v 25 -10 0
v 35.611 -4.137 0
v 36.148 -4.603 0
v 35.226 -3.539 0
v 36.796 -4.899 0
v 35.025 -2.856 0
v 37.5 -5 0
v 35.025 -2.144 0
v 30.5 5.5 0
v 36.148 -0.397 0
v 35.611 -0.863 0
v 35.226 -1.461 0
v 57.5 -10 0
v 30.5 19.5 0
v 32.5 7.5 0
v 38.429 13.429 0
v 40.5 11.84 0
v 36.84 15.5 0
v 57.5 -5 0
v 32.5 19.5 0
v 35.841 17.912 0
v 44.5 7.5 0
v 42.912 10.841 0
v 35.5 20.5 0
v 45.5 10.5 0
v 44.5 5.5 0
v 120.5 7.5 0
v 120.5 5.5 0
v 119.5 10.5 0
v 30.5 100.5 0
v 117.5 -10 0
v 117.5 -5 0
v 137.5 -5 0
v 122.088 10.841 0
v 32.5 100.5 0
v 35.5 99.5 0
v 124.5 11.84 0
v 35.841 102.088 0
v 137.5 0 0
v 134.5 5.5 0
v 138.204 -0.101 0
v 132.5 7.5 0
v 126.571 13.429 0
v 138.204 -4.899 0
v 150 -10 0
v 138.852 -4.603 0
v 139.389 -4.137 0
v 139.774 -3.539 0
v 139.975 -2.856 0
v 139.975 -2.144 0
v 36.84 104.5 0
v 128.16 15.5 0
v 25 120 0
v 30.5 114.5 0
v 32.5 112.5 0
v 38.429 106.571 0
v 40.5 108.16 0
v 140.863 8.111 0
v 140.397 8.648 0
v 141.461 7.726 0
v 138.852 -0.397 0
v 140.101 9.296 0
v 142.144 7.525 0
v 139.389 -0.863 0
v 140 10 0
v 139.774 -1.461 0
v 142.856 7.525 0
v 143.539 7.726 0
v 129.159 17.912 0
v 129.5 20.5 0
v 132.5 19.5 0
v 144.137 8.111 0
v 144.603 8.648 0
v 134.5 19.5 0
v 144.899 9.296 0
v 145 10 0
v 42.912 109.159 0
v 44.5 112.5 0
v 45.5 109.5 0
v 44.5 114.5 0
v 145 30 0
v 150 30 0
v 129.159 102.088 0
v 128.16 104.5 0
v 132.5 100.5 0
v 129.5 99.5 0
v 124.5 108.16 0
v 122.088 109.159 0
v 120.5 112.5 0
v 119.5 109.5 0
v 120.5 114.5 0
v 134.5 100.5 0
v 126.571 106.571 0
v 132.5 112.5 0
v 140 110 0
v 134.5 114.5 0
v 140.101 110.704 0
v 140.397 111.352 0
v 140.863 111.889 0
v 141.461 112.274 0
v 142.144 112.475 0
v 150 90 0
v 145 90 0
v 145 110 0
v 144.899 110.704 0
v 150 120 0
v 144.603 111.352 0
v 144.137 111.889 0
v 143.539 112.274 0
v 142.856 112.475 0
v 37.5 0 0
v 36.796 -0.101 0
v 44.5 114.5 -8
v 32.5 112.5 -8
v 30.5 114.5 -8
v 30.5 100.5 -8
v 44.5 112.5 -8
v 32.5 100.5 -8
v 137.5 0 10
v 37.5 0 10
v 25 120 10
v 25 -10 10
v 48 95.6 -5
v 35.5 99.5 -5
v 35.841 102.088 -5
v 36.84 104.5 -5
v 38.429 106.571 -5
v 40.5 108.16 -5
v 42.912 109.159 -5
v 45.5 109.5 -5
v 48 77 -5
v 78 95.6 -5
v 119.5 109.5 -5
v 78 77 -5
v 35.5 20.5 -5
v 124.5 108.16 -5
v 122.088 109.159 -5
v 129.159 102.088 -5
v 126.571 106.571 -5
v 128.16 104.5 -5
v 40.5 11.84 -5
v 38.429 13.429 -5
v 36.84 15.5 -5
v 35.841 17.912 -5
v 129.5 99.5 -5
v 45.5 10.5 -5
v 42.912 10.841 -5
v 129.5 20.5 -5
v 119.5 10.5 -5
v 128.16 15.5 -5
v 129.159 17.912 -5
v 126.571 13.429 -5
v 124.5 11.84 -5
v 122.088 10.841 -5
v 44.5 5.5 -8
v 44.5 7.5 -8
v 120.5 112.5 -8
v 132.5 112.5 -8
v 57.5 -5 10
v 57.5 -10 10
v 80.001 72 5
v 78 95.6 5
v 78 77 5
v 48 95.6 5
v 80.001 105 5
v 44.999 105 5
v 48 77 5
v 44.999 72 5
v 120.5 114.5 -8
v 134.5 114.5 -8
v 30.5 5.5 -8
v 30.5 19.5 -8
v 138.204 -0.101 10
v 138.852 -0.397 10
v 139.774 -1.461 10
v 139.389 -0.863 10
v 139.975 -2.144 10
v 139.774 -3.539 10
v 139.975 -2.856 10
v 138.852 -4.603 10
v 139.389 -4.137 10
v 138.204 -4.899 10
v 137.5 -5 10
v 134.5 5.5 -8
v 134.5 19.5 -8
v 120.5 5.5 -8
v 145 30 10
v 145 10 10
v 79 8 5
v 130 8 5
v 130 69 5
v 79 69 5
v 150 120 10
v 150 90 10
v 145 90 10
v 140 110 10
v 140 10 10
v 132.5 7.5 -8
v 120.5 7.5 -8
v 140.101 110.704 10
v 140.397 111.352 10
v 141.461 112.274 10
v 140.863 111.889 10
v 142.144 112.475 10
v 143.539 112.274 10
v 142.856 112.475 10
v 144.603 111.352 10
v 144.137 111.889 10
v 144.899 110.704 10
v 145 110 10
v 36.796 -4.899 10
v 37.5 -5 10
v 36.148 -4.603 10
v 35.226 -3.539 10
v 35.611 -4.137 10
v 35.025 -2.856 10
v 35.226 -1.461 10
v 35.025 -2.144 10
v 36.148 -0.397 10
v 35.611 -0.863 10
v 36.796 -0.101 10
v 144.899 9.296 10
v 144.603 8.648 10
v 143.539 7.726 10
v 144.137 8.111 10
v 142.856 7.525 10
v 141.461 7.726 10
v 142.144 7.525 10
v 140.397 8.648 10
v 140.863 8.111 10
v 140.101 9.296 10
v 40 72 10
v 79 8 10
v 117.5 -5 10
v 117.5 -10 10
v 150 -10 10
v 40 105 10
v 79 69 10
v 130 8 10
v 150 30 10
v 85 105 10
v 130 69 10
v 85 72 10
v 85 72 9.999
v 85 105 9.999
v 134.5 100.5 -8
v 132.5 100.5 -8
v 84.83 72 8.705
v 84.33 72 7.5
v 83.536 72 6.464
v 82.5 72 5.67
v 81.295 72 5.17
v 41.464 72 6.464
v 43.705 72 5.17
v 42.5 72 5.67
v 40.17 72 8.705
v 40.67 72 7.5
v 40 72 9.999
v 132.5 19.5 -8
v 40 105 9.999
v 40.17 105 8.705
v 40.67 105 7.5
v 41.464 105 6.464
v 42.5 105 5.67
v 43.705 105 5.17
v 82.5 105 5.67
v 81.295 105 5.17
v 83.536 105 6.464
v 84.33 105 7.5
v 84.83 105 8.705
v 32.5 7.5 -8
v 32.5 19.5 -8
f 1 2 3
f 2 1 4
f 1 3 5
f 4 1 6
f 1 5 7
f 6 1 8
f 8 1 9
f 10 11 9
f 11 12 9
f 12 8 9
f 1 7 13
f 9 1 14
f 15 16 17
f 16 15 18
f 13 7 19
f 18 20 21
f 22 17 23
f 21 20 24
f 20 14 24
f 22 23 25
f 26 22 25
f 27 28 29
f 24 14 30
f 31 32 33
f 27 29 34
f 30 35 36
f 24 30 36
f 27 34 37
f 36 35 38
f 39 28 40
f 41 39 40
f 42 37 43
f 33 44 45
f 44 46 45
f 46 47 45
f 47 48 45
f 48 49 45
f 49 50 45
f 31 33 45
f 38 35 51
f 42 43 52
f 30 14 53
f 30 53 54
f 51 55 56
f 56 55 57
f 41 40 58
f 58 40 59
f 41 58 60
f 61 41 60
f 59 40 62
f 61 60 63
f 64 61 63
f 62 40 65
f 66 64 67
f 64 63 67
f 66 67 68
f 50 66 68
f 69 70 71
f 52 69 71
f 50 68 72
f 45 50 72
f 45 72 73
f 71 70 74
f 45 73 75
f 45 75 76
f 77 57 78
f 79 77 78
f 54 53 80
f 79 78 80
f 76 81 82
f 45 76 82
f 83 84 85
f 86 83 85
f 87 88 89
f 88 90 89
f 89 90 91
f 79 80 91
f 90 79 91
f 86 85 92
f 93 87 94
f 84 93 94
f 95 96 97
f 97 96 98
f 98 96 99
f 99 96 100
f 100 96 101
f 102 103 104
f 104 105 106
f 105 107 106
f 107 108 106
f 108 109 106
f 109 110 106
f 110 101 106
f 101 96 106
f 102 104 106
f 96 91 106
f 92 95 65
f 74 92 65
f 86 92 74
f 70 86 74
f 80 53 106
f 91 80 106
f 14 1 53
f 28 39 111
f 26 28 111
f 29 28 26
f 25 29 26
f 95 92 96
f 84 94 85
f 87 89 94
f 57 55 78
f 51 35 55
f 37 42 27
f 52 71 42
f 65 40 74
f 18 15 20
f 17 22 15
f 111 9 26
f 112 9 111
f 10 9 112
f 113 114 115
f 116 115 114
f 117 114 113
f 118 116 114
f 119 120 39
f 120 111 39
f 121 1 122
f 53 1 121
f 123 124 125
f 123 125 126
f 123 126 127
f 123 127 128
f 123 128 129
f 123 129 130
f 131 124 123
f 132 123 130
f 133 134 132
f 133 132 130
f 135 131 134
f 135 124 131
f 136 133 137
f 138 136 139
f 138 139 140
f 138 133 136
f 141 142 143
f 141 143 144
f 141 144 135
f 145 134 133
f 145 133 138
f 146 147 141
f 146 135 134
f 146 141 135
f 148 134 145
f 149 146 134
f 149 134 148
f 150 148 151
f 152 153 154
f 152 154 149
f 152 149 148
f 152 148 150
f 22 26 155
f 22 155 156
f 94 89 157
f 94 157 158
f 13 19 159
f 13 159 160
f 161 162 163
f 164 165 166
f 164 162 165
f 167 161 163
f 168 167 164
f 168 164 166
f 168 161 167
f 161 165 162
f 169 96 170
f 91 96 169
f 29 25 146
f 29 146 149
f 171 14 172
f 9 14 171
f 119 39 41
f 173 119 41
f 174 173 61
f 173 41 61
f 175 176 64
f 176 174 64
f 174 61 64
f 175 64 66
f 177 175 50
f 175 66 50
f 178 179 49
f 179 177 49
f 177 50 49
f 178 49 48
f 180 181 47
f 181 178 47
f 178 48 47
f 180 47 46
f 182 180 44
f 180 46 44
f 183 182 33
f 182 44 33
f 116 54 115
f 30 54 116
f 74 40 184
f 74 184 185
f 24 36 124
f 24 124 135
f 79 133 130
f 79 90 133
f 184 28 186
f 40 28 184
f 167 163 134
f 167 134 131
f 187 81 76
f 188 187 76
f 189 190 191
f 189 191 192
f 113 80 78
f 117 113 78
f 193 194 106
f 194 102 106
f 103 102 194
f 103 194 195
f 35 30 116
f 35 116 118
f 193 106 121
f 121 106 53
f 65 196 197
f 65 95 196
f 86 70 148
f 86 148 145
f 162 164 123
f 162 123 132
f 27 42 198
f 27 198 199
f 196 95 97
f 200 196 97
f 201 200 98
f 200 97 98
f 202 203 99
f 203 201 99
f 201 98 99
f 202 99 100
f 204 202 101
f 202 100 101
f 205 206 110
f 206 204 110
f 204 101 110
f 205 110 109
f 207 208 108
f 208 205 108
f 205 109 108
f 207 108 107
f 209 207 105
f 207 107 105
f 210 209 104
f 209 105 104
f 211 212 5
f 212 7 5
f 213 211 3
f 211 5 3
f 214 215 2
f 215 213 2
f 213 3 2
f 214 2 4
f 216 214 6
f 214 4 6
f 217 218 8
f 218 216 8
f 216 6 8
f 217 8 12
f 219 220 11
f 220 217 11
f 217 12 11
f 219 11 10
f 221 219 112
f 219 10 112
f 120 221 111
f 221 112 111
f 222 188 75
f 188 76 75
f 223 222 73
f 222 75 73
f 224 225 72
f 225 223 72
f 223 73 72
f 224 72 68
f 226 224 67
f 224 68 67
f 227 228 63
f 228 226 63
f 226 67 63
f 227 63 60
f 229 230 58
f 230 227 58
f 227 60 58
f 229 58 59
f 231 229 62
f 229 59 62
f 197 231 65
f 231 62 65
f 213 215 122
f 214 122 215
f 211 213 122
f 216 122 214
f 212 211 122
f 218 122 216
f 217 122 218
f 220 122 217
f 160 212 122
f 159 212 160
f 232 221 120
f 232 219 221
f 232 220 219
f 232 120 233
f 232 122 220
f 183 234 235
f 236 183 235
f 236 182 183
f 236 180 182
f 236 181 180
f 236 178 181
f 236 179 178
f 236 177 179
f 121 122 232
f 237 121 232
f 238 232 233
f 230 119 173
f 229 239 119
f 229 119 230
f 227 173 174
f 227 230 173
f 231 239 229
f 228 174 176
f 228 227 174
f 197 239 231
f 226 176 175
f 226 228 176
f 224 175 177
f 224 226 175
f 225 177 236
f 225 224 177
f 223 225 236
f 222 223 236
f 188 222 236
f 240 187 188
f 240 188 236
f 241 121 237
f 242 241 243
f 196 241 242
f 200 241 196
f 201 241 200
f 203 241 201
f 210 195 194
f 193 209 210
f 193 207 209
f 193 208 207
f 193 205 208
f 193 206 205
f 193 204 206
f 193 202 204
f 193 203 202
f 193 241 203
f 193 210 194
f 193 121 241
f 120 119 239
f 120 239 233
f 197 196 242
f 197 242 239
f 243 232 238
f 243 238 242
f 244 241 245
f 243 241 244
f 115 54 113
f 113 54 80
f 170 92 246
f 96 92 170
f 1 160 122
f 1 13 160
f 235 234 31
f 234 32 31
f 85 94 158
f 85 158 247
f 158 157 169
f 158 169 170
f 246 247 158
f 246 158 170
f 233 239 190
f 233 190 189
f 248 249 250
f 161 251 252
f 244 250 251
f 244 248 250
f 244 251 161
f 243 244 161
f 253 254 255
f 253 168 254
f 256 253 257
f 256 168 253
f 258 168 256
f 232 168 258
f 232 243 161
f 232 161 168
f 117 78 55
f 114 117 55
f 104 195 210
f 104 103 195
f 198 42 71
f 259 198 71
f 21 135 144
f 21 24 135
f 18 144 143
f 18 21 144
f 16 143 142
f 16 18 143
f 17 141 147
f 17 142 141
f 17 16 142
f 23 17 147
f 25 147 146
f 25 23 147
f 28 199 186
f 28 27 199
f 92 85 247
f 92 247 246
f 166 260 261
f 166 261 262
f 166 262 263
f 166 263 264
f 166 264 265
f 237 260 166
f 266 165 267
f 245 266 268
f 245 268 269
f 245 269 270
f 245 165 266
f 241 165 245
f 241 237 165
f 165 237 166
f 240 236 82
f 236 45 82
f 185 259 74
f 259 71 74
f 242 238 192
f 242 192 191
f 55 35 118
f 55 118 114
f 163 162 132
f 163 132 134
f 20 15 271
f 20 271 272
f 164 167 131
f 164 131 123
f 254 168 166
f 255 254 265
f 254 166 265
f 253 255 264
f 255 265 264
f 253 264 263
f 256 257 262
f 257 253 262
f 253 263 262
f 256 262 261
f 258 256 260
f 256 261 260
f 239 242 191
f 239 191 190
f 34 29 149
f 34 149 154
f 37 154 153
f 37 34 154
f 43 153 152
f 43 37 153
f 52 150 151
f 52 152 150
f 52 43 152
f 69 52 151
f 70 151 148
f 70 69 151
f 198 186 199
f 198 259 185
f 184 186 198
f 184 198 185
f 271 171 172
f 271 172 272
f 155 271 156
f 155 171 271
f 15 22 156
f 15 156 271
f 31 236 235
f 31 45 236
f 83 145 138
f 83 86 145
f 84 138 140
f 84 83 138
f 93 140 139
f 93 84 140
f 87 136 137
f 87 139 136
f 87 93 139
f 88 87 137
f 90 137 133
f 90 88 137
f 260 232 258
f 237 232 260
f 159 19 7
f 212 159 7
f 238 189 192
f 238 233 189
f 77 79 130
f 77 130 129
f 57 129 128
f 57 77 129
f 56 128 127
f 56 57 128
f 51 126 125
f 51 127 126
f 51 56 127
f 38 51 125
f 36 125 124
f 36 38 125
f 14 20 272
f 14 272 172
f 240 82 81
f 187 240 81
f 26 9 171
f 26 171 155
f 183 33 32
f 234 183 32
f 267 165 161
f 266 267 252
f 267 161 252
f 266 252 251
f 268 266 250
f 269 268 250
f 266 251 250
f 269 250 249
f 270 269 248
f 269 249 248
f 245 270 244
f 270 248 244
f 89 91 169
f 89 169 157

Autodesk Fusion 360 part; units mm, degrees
sketch "草图1" plane through (0, 0, 0) normal (0, 0, 1) x (1, 0, 0)
  line L0 (57.5, -10) -> (25, -10)
  line L1 (25, -10) -> (25, 0)
  line L2 (25, 0) -> (150, 0)
  line L3 (57.5, -5) -> (57.5, -10)
  line L4 (87.5, 0) -> (117.5, 0)
  arc A0 (137.5, -5) -> (137.5, 0) centre (137.5, -2.5) ccw
  line L5 (150, 30) -> (145, 30)
  arc A1 (37.5, 0) -> (37.5, -5) centre (37.5, -2.5) ccw
  line L6 (150, -10) -> (117.5, -10)
  line L7 (140, 110) -> (140, 60)
  line L8 (150, 120) -> (25, 120)
  line L9 (150, 90) -> (145, 90)
  line L10 (150, 90) -> (150, 120)
  line L11 (87.5, 0) -> (87.5, 120) construction
  line L12 (117.5, -5) -> (117.5, -10)
  line L13 (145, 30) -> (145, 10)
  arc A2 (140, 10) -> (145, 10) centre (142.5, 10) ccw
  line L14 (150, 0) -> (150, 30)
  line L15 (150, 0) -> (150, -10)
  line L16 (137.5, -5) -> (117.5, -5)
  line L17 (140, 10) -> (140, 60)
  line L18 (145, 90) -> (145, 110)
  arc A3 (145, 110) -> (140, 110) centre (142.5, 110) ccw
  line L19 (57.5, -5) -> (37.5, -5)
  line L20 (25, 0) -> (150, 0)
  line L21 (25, 120) -> (25, 0)
  dimension "d1" = 120
  dimension "d2" = 125
  dimension "d3" = 100
  dimension "d4" = 20
  dimension "d5" = 20
  dimension "d6" = 5
  dimension "d7" = 5
  dimension "d8" = 2.5
  dimension "d9" = 2.5
  dimension "d10" = 10
extrude "拉伸1" add sketch "草图1" along normal blind 10 makes body 1
sketch "草图2" plane through (0, 0, 0) normal (0, 0, -1) x (1, 0, 0)
  line L0 (150, -120) -> (150, -90)
  line L1 (150, -90) -> (145, -90)
  line L2 (145, -90) -> (145, -110)
  arc A0 (140, -110) -> (145, -110) centre (142.5, -110) ccw
  line L3 (140, -110) -> (140, -10)
  arc A1 (145, -10) -> (140, -10) centre (142.5, -10) ccw
  line L4 (145, -10) -> (145, -30)
  line L5 (145, -30) -> (150, -30)
  line L6 (150, -30) -> (150, 10)
  line L7 (150, 10) -> (117.5, 10)
  line L8 (117.5, 10) -> (117.5, 5)
  line L9 (117.5, 5) -> (137.5, 5)
  arc A2 (137.5, 0) -> (137.5, 5) centre (137.5, 2.5) ccw
  line L10 (137.5, 0) -> (37.5, 0)
  arc A3 (37.5, 5) -> (37.5, 0) centre (37.5, 2.5) ccw
  line L11 (37.5, 5) -> (57.5, 5)
  line L12 (57.5, 5) -> (57.5, 10)
  line L13 (57.5, 10) -> (25, 10)
  line L14 (25, 10) -> (25, -120)
  line L15 (25, -120) -> (150, -120)
  line L16 (45.5, -10.5) -> (119.5, -10.5)
  line L17 (129.5, -20.5) -> (129.5, -99.5)
  line L18 (119.5, -109.5) -> (45.5, -109.5)
  line L19 (35.5, -99.5) -> (35.5, -20.5)
  arc A4 (45.5, -10.5) -> (35.5, -20.5) centre (45.5, -20.5) ccw
  arc A5 (129.5, -20.5) -> (119.5, -10.5) centre (119.5, -20.5) ccw
  arc A6 (119.5, -109.5) -> (129.5, -99.5) centre (119.5, -99.5) ccw
  arc A7 (35.5, -99.5) -> (45.5, -109.5) centre (45.5, -99.5) ccw
  point P0 (35.5, -10.5)
  point P1 (129.5, -10.5)
  point P2 (35.5, -109.5)
  dimension "d13" = 94
  dimension "d14" = 99
  dimension "d15" = 10.5
  dimension "d16" = 10.5
  dimension "d17" = 10.5
  dimension "d18" = 10.5
  dimension "d19" = 10
  dimension "d20" = 10
  dimension "d21" = 10
  dimension "d22" = 10
extrude "拉伸2" add sketch "草图2" along normal blind 5 contours L16 L17 L18 L19 A4 A5 A6 A7 bodies 1
sketch "草图3" plane through (0, 0, 0) normal (0, 0, -1) x (1, 0, 0)
  line L0 (45.5, -10.5) -> (119.5, -10.5)
  arc A0 (129.5, -20.5) -> (119.5, -10.5) centre (119.5, -20.5) ccw
  line L1 (129.5, -20.5) -> (129.5, -99.5)
  arc A1 (119.5, -109.5) -> (129.5, -99.5) centre (119.5, -99.5) ccw
  line L2 (119.5, -109.5) -> (45.5, -109.5)
  arc A2 (35.5, -99.5) -> (45.5, -109.5) centre (45.5, -99.5) ccw
  line L3 (35.5, -99.5) -> (35.5, -20.5)
  arc A3 (45.5, -10.5) -> (35.5, -20.5) centre (45.5, -20.5) ccw
  line L4 (150, -120) -> (150, -90)
  line L5 (150, -90) -> (145, -90)
  line L6 (145, -90) -> (145, -110)
  arc A4 (140, -110) -> (145, -110) centre (142.5, -110) ccw
  line L7 (140, -110) -> (140, -10)
  arc A5 (145, -10) -> (140, -10) centre (142.5, -10) ccw
  line L8 (145, -10) -> (145, -30)
  line L9 (145, -30) -> (150, -30)
  line L10 (150, -30) -> (150, 10)
  line L11 (150, 10) -> (117.5, 10)
  line L12 (117.5, 10) -> (117.5, 5)
  line L13 (117.5, 5) -> (137.5, 5)
  arc A6 (137.5, 0) -> (137.5, 5) centre (137.5, 2.5) ccw
  line L14 (137.5, 0) -> (37.5, 0)
  arc A7 (37.5, 5) -> (37.5, 0) centre (37.5, 2.5) ccw
  line L15 (37.5, 5) -> (57.5, 5)
  line L16 (57.5, 5) -> (57.5, 10)
  line L17 (57.5, 10) -> (25, 10)
  line L18 (25, 10) -> (25, -120)
  line L19 (25, -120) -> (150, -120)
  line L20 (30.5, -5.5) -> (44.5, -5.5)
  line L21 (44.5, -5.5) -> (44.5, -7.5)
  line L22 (44.5, -7.5) -> (32.5, -7.5)
  line L23 (30.5, -7.5) -> (30.5, -5.5)
  line L24 (30.5, -5.5) -> (33.5, -5.5)
  line L25 (32.5, -7.5) -> (32.5, -19.5)
  line L26 (32.5, -19.5) -> (30.5, -19.5)
  line L27 (30.5, -19.5) -> (30.5, -5.5)
  line L28 (120.5, -5.5) -> (134.5, -5.5)
  line L29 (134.5, -5.5) -> (134.5, -8.5)
  line L30 (132.5, -7.5) -> (120.5, -7.5)
  line L31 (120.5, -7.5) -> (120.5, -5.5)
  line L32 (134.5, -5.5) -> (131.5, -5.5)
  line L33 (132.5, -7.5) -> (132.5, -19.5)
  line L34 (132.5, -19.5) -> (134.5, -19.5)
  line L35 (134.5, -19.5) -> (134.5, -5.5)
  line L36 (30.5, -100.5) -> (32.5, -100.5)
  line L37 (32.5, -100.5) -> (32.5, -112.5)
  line L38 (33.5, -114.5) -> (30.5, -114.5)
  line L39 (30.5, -114.5) -> (30.5, -100.5)
  line L40 (30.5, -114.5) -> (44.5, -114.5)
  line L41 (44.5, -114.5) -> (44.5, -112.5)
  line L42 (44.5, -112.5) -> (32.5, -112.5)
  line L43 (30.5, -111.5) -> (30.5, -114.5)
  line L44 (120.5, -112.5) -> (132.5, -112.5)
  line L45 (134.5, -112.5) -> (134.5, -114.5)
  line L46 (134.5, -114.5) -> (120.5, -114.5)
  line L47 (120.5, -114.5) -> (120.5, -112.5)
  line L48 (134.5, -114.5) -> (131.5, -114.5)
  line L49 (132.5, -112.5) -> (132.5, -100.5)
  line L50 (132.5, -100.5) -> (134.5, -100.5)
  line L51 (134.5, -100.5) -> (134.5, -114.5)
  dimension "d28" = 14
  dimension "d29" = 5.5
  dimension "d30" = 5.5
  dimension "d31" = 14
  dimension "d32" = 2
  dimension "d34" = 14
  dimension "d35" = 5.5
  dimension "d36" = 5.5
  dimension "d37" = 2
  dimension "d38" = 14
  dimension "d39" = 14
  dimension "d41" = 5.5
  dimension "d42" = 5.5
  dimension "d43" = 14
  dimension "d44" = 2
  dimension "d45" = 14
  dimension "d46" = 5.5
  dimension "d47" = 5.5
  dimension "d107" = 2
  dimension "d108" = 14
  dimension "d109" = 2
  dimension "d110" = 2
  dimension "d111" = 2
  dimension "d112" = 2
extrude "拉伸3" add sketch "草图3" along normal blind 8 contours L20 L21 L22 L23 L24 L25 L26 L27 | L28 L29 L30 L31 L32 L33 L34 L35 | L36 L37 L38 L39 L40 L41 L42 L43 | L44 L45 L46 L47 L48 L49 L50 L51 bodies 1
sketch "草图4" plane through (0, 0, 10) normal (0, 0, 1) x (-1, 0, 0)
  line L0 (-150, -90) -> (-150, -120)
  line L1 (-150, -120) -> (-25, -120)
  line L2 (-25, -120) -> (-25, 10)
  line L3 (-25, 10) -> (-57.5, 10)
  line L4 (-57.5, 10) -> (-57.5, 5)
  line L5 (-57.5, 5) -> (-37.5, 5)
  arc A0 (-37.5, 0) -> (-37.5, 5) centre (-37.5, 2.5) ccw
  line L6 (-37.5, 0) -> (-137.5, 0)
  arc A1 (-137.5, 5) -> (-137.5, 0) centre (-137.5, 2.5) ccw
  line L7 (-137.5, 5) -> (-117.5, 5)
  line L8 (-117.5, 5) -> (-117.5, 10)
  line L9 (-117.5, 10) -> (-150, 10)
  line L10 (-150, 10) -> (-150, -30)
  line L11 (-150, -30) -> (-145, -30)
  line L12 (-145, -30) -> (-145, -10)
  arc A2 (-140, -10) -> (-145, -10) centre (-142.5, -10) ccw
  line L13 (-140, -10) -> (-140, -110)
  arc A3 (-145, -110) -> (-140, -110) centre (-142.5, -110) ccw
  line L14 (-145, -110) -> (-145, -90)
  line L15 (-145, -90) -> (-150, -90)
  line L16 (-40, -105) -> (-85, -105)
  line L17 (-85, -105) -> (-85, -72)
  line L18 (-85, -72) -> (-40, -72)
  line L19 (-40, -72) -> (-40, -105)
  dimension "d50" = 45
  dimension "d51" = 33
  dimension "d52" = 15
  dimension "d53" = 15
extrude "拉伸4" cut sketch "草图4" against normal blind 5 contours L16 L17 L18 L19 bodies 1
fillet "圆角1" radius 5 1 edges at (40, 88.5, 5) on bodies 1
fillet "圆角2" radius 5 1 edges at (85, 88.5, 5) on bodies 1
sketch "草图5" plane through (0, 0, 10) normal (0, 0, 1) x (-1, 0, 0)
  line L0 (-85, -105) -> (-85, -72)
  line L1 (-85, -72) -> (-40, -72)
  line L2 (-40, -72) -> (-40, -105)
  line L3 (-40, -105) -> (-85, -105)
  line L4 (-150, -90) -> (-150, -120)
  line L5 (-150, -120) -> (-25, -120)
  line L6 (-25, -120) -> (-25, 10)
  line L7 (-25, 10) -> (-57.5, 10)
  line L8 (-57.5, 10) -> (-57.5, 5)
  line L9 (-57.5, 5) -> (-37.5, 5)
  arc A0 (-37.5, 0) -> (-37.5, 5) centre (-37.5, 2.5) ccw
  line L10 (-37.5, 0) -> (-137.5, 0)
  arc A1 (-137.5, 5) -> (-137.5, 0) centre (-137.5, 2.5) ccw
  line L11 (-137.5, 5) -> (-117.5, 5)
  line L12 (-117.5, 5) -> (-117.5, 10)
  line L13 (-117.5, 10) -> (-150, 10)
  line L14 (-150, 10) -> (-150, -30)
  line L15 (-150, -30) -> (-145, -30)
  line L16 (-145, -30) -> (-145, -10)
  arc A2 (-140, -10) -> (-145, -10) centre (-142.5, -10) ccw
  line L17 (-140, -10) -> (-140, -110)
  arc A3 (-145, -110) -> (-140, -110) centre (-142.5, -110) ccw
  line L18 (-145, -110) -> (-145, -90)
  line L19 (-145, -90) -> (-150, -90)
  line L20 (-79, -69) -> (-130, -69)
  line L21 (-130, -69) -> (-130, -8)
  line L22 (-130, -8) -> (-79, -8)
  line L23 (-79, -8) -> (-79, -69)
  dimension "d60" = 10
  dimension "d61" = 8
  dimension "d113" = 61
  dimension "d114" = 51
sketch "草图12" plane through (0, 0, 5) normal (0, 0, 1) x (-1, 0, 0)
  line L0 (-80, -72) -> (-80, -105)
  line L1 (-80, -105) -> (-45, -105)
  line L2 (-45, -105) -> (-45, -72)
  line L3 (-45, -72) -> (-80, -72)
  line L4 (-85, -72) -> (-40, -72)
  line L5 (-48, -95.6) -> (-78, -95.6)
  line L6 (-78, -95.6) -> (-78, -77)
  line L7 (-78, -77) -> (-48, -77)
  line L8 (-48, -77) -> (-48, -95.6)
  dimension "d92" = 30
  dimension "d93" = 18.6
  dimension "d94" = 5
  dimension "d95" = 2
extrude "拉伸13" cut sketch "草图12" against normal blind 11 contours L5 L6 L7 L8 bodies 1
copy_body "实体->零部件2" bodies 1 removing the originals makes body 2 in component "支架2"
extrude "拉伸1'" cut sketch "草图5" against normal blind 5 contours L20 L21 L22 L23 bodies 2 in component "支架2"
component "支架2" placed x (1, 0, 0) y (0, 1, 0) z (0, 0, 1) at (0, 0, 0)
